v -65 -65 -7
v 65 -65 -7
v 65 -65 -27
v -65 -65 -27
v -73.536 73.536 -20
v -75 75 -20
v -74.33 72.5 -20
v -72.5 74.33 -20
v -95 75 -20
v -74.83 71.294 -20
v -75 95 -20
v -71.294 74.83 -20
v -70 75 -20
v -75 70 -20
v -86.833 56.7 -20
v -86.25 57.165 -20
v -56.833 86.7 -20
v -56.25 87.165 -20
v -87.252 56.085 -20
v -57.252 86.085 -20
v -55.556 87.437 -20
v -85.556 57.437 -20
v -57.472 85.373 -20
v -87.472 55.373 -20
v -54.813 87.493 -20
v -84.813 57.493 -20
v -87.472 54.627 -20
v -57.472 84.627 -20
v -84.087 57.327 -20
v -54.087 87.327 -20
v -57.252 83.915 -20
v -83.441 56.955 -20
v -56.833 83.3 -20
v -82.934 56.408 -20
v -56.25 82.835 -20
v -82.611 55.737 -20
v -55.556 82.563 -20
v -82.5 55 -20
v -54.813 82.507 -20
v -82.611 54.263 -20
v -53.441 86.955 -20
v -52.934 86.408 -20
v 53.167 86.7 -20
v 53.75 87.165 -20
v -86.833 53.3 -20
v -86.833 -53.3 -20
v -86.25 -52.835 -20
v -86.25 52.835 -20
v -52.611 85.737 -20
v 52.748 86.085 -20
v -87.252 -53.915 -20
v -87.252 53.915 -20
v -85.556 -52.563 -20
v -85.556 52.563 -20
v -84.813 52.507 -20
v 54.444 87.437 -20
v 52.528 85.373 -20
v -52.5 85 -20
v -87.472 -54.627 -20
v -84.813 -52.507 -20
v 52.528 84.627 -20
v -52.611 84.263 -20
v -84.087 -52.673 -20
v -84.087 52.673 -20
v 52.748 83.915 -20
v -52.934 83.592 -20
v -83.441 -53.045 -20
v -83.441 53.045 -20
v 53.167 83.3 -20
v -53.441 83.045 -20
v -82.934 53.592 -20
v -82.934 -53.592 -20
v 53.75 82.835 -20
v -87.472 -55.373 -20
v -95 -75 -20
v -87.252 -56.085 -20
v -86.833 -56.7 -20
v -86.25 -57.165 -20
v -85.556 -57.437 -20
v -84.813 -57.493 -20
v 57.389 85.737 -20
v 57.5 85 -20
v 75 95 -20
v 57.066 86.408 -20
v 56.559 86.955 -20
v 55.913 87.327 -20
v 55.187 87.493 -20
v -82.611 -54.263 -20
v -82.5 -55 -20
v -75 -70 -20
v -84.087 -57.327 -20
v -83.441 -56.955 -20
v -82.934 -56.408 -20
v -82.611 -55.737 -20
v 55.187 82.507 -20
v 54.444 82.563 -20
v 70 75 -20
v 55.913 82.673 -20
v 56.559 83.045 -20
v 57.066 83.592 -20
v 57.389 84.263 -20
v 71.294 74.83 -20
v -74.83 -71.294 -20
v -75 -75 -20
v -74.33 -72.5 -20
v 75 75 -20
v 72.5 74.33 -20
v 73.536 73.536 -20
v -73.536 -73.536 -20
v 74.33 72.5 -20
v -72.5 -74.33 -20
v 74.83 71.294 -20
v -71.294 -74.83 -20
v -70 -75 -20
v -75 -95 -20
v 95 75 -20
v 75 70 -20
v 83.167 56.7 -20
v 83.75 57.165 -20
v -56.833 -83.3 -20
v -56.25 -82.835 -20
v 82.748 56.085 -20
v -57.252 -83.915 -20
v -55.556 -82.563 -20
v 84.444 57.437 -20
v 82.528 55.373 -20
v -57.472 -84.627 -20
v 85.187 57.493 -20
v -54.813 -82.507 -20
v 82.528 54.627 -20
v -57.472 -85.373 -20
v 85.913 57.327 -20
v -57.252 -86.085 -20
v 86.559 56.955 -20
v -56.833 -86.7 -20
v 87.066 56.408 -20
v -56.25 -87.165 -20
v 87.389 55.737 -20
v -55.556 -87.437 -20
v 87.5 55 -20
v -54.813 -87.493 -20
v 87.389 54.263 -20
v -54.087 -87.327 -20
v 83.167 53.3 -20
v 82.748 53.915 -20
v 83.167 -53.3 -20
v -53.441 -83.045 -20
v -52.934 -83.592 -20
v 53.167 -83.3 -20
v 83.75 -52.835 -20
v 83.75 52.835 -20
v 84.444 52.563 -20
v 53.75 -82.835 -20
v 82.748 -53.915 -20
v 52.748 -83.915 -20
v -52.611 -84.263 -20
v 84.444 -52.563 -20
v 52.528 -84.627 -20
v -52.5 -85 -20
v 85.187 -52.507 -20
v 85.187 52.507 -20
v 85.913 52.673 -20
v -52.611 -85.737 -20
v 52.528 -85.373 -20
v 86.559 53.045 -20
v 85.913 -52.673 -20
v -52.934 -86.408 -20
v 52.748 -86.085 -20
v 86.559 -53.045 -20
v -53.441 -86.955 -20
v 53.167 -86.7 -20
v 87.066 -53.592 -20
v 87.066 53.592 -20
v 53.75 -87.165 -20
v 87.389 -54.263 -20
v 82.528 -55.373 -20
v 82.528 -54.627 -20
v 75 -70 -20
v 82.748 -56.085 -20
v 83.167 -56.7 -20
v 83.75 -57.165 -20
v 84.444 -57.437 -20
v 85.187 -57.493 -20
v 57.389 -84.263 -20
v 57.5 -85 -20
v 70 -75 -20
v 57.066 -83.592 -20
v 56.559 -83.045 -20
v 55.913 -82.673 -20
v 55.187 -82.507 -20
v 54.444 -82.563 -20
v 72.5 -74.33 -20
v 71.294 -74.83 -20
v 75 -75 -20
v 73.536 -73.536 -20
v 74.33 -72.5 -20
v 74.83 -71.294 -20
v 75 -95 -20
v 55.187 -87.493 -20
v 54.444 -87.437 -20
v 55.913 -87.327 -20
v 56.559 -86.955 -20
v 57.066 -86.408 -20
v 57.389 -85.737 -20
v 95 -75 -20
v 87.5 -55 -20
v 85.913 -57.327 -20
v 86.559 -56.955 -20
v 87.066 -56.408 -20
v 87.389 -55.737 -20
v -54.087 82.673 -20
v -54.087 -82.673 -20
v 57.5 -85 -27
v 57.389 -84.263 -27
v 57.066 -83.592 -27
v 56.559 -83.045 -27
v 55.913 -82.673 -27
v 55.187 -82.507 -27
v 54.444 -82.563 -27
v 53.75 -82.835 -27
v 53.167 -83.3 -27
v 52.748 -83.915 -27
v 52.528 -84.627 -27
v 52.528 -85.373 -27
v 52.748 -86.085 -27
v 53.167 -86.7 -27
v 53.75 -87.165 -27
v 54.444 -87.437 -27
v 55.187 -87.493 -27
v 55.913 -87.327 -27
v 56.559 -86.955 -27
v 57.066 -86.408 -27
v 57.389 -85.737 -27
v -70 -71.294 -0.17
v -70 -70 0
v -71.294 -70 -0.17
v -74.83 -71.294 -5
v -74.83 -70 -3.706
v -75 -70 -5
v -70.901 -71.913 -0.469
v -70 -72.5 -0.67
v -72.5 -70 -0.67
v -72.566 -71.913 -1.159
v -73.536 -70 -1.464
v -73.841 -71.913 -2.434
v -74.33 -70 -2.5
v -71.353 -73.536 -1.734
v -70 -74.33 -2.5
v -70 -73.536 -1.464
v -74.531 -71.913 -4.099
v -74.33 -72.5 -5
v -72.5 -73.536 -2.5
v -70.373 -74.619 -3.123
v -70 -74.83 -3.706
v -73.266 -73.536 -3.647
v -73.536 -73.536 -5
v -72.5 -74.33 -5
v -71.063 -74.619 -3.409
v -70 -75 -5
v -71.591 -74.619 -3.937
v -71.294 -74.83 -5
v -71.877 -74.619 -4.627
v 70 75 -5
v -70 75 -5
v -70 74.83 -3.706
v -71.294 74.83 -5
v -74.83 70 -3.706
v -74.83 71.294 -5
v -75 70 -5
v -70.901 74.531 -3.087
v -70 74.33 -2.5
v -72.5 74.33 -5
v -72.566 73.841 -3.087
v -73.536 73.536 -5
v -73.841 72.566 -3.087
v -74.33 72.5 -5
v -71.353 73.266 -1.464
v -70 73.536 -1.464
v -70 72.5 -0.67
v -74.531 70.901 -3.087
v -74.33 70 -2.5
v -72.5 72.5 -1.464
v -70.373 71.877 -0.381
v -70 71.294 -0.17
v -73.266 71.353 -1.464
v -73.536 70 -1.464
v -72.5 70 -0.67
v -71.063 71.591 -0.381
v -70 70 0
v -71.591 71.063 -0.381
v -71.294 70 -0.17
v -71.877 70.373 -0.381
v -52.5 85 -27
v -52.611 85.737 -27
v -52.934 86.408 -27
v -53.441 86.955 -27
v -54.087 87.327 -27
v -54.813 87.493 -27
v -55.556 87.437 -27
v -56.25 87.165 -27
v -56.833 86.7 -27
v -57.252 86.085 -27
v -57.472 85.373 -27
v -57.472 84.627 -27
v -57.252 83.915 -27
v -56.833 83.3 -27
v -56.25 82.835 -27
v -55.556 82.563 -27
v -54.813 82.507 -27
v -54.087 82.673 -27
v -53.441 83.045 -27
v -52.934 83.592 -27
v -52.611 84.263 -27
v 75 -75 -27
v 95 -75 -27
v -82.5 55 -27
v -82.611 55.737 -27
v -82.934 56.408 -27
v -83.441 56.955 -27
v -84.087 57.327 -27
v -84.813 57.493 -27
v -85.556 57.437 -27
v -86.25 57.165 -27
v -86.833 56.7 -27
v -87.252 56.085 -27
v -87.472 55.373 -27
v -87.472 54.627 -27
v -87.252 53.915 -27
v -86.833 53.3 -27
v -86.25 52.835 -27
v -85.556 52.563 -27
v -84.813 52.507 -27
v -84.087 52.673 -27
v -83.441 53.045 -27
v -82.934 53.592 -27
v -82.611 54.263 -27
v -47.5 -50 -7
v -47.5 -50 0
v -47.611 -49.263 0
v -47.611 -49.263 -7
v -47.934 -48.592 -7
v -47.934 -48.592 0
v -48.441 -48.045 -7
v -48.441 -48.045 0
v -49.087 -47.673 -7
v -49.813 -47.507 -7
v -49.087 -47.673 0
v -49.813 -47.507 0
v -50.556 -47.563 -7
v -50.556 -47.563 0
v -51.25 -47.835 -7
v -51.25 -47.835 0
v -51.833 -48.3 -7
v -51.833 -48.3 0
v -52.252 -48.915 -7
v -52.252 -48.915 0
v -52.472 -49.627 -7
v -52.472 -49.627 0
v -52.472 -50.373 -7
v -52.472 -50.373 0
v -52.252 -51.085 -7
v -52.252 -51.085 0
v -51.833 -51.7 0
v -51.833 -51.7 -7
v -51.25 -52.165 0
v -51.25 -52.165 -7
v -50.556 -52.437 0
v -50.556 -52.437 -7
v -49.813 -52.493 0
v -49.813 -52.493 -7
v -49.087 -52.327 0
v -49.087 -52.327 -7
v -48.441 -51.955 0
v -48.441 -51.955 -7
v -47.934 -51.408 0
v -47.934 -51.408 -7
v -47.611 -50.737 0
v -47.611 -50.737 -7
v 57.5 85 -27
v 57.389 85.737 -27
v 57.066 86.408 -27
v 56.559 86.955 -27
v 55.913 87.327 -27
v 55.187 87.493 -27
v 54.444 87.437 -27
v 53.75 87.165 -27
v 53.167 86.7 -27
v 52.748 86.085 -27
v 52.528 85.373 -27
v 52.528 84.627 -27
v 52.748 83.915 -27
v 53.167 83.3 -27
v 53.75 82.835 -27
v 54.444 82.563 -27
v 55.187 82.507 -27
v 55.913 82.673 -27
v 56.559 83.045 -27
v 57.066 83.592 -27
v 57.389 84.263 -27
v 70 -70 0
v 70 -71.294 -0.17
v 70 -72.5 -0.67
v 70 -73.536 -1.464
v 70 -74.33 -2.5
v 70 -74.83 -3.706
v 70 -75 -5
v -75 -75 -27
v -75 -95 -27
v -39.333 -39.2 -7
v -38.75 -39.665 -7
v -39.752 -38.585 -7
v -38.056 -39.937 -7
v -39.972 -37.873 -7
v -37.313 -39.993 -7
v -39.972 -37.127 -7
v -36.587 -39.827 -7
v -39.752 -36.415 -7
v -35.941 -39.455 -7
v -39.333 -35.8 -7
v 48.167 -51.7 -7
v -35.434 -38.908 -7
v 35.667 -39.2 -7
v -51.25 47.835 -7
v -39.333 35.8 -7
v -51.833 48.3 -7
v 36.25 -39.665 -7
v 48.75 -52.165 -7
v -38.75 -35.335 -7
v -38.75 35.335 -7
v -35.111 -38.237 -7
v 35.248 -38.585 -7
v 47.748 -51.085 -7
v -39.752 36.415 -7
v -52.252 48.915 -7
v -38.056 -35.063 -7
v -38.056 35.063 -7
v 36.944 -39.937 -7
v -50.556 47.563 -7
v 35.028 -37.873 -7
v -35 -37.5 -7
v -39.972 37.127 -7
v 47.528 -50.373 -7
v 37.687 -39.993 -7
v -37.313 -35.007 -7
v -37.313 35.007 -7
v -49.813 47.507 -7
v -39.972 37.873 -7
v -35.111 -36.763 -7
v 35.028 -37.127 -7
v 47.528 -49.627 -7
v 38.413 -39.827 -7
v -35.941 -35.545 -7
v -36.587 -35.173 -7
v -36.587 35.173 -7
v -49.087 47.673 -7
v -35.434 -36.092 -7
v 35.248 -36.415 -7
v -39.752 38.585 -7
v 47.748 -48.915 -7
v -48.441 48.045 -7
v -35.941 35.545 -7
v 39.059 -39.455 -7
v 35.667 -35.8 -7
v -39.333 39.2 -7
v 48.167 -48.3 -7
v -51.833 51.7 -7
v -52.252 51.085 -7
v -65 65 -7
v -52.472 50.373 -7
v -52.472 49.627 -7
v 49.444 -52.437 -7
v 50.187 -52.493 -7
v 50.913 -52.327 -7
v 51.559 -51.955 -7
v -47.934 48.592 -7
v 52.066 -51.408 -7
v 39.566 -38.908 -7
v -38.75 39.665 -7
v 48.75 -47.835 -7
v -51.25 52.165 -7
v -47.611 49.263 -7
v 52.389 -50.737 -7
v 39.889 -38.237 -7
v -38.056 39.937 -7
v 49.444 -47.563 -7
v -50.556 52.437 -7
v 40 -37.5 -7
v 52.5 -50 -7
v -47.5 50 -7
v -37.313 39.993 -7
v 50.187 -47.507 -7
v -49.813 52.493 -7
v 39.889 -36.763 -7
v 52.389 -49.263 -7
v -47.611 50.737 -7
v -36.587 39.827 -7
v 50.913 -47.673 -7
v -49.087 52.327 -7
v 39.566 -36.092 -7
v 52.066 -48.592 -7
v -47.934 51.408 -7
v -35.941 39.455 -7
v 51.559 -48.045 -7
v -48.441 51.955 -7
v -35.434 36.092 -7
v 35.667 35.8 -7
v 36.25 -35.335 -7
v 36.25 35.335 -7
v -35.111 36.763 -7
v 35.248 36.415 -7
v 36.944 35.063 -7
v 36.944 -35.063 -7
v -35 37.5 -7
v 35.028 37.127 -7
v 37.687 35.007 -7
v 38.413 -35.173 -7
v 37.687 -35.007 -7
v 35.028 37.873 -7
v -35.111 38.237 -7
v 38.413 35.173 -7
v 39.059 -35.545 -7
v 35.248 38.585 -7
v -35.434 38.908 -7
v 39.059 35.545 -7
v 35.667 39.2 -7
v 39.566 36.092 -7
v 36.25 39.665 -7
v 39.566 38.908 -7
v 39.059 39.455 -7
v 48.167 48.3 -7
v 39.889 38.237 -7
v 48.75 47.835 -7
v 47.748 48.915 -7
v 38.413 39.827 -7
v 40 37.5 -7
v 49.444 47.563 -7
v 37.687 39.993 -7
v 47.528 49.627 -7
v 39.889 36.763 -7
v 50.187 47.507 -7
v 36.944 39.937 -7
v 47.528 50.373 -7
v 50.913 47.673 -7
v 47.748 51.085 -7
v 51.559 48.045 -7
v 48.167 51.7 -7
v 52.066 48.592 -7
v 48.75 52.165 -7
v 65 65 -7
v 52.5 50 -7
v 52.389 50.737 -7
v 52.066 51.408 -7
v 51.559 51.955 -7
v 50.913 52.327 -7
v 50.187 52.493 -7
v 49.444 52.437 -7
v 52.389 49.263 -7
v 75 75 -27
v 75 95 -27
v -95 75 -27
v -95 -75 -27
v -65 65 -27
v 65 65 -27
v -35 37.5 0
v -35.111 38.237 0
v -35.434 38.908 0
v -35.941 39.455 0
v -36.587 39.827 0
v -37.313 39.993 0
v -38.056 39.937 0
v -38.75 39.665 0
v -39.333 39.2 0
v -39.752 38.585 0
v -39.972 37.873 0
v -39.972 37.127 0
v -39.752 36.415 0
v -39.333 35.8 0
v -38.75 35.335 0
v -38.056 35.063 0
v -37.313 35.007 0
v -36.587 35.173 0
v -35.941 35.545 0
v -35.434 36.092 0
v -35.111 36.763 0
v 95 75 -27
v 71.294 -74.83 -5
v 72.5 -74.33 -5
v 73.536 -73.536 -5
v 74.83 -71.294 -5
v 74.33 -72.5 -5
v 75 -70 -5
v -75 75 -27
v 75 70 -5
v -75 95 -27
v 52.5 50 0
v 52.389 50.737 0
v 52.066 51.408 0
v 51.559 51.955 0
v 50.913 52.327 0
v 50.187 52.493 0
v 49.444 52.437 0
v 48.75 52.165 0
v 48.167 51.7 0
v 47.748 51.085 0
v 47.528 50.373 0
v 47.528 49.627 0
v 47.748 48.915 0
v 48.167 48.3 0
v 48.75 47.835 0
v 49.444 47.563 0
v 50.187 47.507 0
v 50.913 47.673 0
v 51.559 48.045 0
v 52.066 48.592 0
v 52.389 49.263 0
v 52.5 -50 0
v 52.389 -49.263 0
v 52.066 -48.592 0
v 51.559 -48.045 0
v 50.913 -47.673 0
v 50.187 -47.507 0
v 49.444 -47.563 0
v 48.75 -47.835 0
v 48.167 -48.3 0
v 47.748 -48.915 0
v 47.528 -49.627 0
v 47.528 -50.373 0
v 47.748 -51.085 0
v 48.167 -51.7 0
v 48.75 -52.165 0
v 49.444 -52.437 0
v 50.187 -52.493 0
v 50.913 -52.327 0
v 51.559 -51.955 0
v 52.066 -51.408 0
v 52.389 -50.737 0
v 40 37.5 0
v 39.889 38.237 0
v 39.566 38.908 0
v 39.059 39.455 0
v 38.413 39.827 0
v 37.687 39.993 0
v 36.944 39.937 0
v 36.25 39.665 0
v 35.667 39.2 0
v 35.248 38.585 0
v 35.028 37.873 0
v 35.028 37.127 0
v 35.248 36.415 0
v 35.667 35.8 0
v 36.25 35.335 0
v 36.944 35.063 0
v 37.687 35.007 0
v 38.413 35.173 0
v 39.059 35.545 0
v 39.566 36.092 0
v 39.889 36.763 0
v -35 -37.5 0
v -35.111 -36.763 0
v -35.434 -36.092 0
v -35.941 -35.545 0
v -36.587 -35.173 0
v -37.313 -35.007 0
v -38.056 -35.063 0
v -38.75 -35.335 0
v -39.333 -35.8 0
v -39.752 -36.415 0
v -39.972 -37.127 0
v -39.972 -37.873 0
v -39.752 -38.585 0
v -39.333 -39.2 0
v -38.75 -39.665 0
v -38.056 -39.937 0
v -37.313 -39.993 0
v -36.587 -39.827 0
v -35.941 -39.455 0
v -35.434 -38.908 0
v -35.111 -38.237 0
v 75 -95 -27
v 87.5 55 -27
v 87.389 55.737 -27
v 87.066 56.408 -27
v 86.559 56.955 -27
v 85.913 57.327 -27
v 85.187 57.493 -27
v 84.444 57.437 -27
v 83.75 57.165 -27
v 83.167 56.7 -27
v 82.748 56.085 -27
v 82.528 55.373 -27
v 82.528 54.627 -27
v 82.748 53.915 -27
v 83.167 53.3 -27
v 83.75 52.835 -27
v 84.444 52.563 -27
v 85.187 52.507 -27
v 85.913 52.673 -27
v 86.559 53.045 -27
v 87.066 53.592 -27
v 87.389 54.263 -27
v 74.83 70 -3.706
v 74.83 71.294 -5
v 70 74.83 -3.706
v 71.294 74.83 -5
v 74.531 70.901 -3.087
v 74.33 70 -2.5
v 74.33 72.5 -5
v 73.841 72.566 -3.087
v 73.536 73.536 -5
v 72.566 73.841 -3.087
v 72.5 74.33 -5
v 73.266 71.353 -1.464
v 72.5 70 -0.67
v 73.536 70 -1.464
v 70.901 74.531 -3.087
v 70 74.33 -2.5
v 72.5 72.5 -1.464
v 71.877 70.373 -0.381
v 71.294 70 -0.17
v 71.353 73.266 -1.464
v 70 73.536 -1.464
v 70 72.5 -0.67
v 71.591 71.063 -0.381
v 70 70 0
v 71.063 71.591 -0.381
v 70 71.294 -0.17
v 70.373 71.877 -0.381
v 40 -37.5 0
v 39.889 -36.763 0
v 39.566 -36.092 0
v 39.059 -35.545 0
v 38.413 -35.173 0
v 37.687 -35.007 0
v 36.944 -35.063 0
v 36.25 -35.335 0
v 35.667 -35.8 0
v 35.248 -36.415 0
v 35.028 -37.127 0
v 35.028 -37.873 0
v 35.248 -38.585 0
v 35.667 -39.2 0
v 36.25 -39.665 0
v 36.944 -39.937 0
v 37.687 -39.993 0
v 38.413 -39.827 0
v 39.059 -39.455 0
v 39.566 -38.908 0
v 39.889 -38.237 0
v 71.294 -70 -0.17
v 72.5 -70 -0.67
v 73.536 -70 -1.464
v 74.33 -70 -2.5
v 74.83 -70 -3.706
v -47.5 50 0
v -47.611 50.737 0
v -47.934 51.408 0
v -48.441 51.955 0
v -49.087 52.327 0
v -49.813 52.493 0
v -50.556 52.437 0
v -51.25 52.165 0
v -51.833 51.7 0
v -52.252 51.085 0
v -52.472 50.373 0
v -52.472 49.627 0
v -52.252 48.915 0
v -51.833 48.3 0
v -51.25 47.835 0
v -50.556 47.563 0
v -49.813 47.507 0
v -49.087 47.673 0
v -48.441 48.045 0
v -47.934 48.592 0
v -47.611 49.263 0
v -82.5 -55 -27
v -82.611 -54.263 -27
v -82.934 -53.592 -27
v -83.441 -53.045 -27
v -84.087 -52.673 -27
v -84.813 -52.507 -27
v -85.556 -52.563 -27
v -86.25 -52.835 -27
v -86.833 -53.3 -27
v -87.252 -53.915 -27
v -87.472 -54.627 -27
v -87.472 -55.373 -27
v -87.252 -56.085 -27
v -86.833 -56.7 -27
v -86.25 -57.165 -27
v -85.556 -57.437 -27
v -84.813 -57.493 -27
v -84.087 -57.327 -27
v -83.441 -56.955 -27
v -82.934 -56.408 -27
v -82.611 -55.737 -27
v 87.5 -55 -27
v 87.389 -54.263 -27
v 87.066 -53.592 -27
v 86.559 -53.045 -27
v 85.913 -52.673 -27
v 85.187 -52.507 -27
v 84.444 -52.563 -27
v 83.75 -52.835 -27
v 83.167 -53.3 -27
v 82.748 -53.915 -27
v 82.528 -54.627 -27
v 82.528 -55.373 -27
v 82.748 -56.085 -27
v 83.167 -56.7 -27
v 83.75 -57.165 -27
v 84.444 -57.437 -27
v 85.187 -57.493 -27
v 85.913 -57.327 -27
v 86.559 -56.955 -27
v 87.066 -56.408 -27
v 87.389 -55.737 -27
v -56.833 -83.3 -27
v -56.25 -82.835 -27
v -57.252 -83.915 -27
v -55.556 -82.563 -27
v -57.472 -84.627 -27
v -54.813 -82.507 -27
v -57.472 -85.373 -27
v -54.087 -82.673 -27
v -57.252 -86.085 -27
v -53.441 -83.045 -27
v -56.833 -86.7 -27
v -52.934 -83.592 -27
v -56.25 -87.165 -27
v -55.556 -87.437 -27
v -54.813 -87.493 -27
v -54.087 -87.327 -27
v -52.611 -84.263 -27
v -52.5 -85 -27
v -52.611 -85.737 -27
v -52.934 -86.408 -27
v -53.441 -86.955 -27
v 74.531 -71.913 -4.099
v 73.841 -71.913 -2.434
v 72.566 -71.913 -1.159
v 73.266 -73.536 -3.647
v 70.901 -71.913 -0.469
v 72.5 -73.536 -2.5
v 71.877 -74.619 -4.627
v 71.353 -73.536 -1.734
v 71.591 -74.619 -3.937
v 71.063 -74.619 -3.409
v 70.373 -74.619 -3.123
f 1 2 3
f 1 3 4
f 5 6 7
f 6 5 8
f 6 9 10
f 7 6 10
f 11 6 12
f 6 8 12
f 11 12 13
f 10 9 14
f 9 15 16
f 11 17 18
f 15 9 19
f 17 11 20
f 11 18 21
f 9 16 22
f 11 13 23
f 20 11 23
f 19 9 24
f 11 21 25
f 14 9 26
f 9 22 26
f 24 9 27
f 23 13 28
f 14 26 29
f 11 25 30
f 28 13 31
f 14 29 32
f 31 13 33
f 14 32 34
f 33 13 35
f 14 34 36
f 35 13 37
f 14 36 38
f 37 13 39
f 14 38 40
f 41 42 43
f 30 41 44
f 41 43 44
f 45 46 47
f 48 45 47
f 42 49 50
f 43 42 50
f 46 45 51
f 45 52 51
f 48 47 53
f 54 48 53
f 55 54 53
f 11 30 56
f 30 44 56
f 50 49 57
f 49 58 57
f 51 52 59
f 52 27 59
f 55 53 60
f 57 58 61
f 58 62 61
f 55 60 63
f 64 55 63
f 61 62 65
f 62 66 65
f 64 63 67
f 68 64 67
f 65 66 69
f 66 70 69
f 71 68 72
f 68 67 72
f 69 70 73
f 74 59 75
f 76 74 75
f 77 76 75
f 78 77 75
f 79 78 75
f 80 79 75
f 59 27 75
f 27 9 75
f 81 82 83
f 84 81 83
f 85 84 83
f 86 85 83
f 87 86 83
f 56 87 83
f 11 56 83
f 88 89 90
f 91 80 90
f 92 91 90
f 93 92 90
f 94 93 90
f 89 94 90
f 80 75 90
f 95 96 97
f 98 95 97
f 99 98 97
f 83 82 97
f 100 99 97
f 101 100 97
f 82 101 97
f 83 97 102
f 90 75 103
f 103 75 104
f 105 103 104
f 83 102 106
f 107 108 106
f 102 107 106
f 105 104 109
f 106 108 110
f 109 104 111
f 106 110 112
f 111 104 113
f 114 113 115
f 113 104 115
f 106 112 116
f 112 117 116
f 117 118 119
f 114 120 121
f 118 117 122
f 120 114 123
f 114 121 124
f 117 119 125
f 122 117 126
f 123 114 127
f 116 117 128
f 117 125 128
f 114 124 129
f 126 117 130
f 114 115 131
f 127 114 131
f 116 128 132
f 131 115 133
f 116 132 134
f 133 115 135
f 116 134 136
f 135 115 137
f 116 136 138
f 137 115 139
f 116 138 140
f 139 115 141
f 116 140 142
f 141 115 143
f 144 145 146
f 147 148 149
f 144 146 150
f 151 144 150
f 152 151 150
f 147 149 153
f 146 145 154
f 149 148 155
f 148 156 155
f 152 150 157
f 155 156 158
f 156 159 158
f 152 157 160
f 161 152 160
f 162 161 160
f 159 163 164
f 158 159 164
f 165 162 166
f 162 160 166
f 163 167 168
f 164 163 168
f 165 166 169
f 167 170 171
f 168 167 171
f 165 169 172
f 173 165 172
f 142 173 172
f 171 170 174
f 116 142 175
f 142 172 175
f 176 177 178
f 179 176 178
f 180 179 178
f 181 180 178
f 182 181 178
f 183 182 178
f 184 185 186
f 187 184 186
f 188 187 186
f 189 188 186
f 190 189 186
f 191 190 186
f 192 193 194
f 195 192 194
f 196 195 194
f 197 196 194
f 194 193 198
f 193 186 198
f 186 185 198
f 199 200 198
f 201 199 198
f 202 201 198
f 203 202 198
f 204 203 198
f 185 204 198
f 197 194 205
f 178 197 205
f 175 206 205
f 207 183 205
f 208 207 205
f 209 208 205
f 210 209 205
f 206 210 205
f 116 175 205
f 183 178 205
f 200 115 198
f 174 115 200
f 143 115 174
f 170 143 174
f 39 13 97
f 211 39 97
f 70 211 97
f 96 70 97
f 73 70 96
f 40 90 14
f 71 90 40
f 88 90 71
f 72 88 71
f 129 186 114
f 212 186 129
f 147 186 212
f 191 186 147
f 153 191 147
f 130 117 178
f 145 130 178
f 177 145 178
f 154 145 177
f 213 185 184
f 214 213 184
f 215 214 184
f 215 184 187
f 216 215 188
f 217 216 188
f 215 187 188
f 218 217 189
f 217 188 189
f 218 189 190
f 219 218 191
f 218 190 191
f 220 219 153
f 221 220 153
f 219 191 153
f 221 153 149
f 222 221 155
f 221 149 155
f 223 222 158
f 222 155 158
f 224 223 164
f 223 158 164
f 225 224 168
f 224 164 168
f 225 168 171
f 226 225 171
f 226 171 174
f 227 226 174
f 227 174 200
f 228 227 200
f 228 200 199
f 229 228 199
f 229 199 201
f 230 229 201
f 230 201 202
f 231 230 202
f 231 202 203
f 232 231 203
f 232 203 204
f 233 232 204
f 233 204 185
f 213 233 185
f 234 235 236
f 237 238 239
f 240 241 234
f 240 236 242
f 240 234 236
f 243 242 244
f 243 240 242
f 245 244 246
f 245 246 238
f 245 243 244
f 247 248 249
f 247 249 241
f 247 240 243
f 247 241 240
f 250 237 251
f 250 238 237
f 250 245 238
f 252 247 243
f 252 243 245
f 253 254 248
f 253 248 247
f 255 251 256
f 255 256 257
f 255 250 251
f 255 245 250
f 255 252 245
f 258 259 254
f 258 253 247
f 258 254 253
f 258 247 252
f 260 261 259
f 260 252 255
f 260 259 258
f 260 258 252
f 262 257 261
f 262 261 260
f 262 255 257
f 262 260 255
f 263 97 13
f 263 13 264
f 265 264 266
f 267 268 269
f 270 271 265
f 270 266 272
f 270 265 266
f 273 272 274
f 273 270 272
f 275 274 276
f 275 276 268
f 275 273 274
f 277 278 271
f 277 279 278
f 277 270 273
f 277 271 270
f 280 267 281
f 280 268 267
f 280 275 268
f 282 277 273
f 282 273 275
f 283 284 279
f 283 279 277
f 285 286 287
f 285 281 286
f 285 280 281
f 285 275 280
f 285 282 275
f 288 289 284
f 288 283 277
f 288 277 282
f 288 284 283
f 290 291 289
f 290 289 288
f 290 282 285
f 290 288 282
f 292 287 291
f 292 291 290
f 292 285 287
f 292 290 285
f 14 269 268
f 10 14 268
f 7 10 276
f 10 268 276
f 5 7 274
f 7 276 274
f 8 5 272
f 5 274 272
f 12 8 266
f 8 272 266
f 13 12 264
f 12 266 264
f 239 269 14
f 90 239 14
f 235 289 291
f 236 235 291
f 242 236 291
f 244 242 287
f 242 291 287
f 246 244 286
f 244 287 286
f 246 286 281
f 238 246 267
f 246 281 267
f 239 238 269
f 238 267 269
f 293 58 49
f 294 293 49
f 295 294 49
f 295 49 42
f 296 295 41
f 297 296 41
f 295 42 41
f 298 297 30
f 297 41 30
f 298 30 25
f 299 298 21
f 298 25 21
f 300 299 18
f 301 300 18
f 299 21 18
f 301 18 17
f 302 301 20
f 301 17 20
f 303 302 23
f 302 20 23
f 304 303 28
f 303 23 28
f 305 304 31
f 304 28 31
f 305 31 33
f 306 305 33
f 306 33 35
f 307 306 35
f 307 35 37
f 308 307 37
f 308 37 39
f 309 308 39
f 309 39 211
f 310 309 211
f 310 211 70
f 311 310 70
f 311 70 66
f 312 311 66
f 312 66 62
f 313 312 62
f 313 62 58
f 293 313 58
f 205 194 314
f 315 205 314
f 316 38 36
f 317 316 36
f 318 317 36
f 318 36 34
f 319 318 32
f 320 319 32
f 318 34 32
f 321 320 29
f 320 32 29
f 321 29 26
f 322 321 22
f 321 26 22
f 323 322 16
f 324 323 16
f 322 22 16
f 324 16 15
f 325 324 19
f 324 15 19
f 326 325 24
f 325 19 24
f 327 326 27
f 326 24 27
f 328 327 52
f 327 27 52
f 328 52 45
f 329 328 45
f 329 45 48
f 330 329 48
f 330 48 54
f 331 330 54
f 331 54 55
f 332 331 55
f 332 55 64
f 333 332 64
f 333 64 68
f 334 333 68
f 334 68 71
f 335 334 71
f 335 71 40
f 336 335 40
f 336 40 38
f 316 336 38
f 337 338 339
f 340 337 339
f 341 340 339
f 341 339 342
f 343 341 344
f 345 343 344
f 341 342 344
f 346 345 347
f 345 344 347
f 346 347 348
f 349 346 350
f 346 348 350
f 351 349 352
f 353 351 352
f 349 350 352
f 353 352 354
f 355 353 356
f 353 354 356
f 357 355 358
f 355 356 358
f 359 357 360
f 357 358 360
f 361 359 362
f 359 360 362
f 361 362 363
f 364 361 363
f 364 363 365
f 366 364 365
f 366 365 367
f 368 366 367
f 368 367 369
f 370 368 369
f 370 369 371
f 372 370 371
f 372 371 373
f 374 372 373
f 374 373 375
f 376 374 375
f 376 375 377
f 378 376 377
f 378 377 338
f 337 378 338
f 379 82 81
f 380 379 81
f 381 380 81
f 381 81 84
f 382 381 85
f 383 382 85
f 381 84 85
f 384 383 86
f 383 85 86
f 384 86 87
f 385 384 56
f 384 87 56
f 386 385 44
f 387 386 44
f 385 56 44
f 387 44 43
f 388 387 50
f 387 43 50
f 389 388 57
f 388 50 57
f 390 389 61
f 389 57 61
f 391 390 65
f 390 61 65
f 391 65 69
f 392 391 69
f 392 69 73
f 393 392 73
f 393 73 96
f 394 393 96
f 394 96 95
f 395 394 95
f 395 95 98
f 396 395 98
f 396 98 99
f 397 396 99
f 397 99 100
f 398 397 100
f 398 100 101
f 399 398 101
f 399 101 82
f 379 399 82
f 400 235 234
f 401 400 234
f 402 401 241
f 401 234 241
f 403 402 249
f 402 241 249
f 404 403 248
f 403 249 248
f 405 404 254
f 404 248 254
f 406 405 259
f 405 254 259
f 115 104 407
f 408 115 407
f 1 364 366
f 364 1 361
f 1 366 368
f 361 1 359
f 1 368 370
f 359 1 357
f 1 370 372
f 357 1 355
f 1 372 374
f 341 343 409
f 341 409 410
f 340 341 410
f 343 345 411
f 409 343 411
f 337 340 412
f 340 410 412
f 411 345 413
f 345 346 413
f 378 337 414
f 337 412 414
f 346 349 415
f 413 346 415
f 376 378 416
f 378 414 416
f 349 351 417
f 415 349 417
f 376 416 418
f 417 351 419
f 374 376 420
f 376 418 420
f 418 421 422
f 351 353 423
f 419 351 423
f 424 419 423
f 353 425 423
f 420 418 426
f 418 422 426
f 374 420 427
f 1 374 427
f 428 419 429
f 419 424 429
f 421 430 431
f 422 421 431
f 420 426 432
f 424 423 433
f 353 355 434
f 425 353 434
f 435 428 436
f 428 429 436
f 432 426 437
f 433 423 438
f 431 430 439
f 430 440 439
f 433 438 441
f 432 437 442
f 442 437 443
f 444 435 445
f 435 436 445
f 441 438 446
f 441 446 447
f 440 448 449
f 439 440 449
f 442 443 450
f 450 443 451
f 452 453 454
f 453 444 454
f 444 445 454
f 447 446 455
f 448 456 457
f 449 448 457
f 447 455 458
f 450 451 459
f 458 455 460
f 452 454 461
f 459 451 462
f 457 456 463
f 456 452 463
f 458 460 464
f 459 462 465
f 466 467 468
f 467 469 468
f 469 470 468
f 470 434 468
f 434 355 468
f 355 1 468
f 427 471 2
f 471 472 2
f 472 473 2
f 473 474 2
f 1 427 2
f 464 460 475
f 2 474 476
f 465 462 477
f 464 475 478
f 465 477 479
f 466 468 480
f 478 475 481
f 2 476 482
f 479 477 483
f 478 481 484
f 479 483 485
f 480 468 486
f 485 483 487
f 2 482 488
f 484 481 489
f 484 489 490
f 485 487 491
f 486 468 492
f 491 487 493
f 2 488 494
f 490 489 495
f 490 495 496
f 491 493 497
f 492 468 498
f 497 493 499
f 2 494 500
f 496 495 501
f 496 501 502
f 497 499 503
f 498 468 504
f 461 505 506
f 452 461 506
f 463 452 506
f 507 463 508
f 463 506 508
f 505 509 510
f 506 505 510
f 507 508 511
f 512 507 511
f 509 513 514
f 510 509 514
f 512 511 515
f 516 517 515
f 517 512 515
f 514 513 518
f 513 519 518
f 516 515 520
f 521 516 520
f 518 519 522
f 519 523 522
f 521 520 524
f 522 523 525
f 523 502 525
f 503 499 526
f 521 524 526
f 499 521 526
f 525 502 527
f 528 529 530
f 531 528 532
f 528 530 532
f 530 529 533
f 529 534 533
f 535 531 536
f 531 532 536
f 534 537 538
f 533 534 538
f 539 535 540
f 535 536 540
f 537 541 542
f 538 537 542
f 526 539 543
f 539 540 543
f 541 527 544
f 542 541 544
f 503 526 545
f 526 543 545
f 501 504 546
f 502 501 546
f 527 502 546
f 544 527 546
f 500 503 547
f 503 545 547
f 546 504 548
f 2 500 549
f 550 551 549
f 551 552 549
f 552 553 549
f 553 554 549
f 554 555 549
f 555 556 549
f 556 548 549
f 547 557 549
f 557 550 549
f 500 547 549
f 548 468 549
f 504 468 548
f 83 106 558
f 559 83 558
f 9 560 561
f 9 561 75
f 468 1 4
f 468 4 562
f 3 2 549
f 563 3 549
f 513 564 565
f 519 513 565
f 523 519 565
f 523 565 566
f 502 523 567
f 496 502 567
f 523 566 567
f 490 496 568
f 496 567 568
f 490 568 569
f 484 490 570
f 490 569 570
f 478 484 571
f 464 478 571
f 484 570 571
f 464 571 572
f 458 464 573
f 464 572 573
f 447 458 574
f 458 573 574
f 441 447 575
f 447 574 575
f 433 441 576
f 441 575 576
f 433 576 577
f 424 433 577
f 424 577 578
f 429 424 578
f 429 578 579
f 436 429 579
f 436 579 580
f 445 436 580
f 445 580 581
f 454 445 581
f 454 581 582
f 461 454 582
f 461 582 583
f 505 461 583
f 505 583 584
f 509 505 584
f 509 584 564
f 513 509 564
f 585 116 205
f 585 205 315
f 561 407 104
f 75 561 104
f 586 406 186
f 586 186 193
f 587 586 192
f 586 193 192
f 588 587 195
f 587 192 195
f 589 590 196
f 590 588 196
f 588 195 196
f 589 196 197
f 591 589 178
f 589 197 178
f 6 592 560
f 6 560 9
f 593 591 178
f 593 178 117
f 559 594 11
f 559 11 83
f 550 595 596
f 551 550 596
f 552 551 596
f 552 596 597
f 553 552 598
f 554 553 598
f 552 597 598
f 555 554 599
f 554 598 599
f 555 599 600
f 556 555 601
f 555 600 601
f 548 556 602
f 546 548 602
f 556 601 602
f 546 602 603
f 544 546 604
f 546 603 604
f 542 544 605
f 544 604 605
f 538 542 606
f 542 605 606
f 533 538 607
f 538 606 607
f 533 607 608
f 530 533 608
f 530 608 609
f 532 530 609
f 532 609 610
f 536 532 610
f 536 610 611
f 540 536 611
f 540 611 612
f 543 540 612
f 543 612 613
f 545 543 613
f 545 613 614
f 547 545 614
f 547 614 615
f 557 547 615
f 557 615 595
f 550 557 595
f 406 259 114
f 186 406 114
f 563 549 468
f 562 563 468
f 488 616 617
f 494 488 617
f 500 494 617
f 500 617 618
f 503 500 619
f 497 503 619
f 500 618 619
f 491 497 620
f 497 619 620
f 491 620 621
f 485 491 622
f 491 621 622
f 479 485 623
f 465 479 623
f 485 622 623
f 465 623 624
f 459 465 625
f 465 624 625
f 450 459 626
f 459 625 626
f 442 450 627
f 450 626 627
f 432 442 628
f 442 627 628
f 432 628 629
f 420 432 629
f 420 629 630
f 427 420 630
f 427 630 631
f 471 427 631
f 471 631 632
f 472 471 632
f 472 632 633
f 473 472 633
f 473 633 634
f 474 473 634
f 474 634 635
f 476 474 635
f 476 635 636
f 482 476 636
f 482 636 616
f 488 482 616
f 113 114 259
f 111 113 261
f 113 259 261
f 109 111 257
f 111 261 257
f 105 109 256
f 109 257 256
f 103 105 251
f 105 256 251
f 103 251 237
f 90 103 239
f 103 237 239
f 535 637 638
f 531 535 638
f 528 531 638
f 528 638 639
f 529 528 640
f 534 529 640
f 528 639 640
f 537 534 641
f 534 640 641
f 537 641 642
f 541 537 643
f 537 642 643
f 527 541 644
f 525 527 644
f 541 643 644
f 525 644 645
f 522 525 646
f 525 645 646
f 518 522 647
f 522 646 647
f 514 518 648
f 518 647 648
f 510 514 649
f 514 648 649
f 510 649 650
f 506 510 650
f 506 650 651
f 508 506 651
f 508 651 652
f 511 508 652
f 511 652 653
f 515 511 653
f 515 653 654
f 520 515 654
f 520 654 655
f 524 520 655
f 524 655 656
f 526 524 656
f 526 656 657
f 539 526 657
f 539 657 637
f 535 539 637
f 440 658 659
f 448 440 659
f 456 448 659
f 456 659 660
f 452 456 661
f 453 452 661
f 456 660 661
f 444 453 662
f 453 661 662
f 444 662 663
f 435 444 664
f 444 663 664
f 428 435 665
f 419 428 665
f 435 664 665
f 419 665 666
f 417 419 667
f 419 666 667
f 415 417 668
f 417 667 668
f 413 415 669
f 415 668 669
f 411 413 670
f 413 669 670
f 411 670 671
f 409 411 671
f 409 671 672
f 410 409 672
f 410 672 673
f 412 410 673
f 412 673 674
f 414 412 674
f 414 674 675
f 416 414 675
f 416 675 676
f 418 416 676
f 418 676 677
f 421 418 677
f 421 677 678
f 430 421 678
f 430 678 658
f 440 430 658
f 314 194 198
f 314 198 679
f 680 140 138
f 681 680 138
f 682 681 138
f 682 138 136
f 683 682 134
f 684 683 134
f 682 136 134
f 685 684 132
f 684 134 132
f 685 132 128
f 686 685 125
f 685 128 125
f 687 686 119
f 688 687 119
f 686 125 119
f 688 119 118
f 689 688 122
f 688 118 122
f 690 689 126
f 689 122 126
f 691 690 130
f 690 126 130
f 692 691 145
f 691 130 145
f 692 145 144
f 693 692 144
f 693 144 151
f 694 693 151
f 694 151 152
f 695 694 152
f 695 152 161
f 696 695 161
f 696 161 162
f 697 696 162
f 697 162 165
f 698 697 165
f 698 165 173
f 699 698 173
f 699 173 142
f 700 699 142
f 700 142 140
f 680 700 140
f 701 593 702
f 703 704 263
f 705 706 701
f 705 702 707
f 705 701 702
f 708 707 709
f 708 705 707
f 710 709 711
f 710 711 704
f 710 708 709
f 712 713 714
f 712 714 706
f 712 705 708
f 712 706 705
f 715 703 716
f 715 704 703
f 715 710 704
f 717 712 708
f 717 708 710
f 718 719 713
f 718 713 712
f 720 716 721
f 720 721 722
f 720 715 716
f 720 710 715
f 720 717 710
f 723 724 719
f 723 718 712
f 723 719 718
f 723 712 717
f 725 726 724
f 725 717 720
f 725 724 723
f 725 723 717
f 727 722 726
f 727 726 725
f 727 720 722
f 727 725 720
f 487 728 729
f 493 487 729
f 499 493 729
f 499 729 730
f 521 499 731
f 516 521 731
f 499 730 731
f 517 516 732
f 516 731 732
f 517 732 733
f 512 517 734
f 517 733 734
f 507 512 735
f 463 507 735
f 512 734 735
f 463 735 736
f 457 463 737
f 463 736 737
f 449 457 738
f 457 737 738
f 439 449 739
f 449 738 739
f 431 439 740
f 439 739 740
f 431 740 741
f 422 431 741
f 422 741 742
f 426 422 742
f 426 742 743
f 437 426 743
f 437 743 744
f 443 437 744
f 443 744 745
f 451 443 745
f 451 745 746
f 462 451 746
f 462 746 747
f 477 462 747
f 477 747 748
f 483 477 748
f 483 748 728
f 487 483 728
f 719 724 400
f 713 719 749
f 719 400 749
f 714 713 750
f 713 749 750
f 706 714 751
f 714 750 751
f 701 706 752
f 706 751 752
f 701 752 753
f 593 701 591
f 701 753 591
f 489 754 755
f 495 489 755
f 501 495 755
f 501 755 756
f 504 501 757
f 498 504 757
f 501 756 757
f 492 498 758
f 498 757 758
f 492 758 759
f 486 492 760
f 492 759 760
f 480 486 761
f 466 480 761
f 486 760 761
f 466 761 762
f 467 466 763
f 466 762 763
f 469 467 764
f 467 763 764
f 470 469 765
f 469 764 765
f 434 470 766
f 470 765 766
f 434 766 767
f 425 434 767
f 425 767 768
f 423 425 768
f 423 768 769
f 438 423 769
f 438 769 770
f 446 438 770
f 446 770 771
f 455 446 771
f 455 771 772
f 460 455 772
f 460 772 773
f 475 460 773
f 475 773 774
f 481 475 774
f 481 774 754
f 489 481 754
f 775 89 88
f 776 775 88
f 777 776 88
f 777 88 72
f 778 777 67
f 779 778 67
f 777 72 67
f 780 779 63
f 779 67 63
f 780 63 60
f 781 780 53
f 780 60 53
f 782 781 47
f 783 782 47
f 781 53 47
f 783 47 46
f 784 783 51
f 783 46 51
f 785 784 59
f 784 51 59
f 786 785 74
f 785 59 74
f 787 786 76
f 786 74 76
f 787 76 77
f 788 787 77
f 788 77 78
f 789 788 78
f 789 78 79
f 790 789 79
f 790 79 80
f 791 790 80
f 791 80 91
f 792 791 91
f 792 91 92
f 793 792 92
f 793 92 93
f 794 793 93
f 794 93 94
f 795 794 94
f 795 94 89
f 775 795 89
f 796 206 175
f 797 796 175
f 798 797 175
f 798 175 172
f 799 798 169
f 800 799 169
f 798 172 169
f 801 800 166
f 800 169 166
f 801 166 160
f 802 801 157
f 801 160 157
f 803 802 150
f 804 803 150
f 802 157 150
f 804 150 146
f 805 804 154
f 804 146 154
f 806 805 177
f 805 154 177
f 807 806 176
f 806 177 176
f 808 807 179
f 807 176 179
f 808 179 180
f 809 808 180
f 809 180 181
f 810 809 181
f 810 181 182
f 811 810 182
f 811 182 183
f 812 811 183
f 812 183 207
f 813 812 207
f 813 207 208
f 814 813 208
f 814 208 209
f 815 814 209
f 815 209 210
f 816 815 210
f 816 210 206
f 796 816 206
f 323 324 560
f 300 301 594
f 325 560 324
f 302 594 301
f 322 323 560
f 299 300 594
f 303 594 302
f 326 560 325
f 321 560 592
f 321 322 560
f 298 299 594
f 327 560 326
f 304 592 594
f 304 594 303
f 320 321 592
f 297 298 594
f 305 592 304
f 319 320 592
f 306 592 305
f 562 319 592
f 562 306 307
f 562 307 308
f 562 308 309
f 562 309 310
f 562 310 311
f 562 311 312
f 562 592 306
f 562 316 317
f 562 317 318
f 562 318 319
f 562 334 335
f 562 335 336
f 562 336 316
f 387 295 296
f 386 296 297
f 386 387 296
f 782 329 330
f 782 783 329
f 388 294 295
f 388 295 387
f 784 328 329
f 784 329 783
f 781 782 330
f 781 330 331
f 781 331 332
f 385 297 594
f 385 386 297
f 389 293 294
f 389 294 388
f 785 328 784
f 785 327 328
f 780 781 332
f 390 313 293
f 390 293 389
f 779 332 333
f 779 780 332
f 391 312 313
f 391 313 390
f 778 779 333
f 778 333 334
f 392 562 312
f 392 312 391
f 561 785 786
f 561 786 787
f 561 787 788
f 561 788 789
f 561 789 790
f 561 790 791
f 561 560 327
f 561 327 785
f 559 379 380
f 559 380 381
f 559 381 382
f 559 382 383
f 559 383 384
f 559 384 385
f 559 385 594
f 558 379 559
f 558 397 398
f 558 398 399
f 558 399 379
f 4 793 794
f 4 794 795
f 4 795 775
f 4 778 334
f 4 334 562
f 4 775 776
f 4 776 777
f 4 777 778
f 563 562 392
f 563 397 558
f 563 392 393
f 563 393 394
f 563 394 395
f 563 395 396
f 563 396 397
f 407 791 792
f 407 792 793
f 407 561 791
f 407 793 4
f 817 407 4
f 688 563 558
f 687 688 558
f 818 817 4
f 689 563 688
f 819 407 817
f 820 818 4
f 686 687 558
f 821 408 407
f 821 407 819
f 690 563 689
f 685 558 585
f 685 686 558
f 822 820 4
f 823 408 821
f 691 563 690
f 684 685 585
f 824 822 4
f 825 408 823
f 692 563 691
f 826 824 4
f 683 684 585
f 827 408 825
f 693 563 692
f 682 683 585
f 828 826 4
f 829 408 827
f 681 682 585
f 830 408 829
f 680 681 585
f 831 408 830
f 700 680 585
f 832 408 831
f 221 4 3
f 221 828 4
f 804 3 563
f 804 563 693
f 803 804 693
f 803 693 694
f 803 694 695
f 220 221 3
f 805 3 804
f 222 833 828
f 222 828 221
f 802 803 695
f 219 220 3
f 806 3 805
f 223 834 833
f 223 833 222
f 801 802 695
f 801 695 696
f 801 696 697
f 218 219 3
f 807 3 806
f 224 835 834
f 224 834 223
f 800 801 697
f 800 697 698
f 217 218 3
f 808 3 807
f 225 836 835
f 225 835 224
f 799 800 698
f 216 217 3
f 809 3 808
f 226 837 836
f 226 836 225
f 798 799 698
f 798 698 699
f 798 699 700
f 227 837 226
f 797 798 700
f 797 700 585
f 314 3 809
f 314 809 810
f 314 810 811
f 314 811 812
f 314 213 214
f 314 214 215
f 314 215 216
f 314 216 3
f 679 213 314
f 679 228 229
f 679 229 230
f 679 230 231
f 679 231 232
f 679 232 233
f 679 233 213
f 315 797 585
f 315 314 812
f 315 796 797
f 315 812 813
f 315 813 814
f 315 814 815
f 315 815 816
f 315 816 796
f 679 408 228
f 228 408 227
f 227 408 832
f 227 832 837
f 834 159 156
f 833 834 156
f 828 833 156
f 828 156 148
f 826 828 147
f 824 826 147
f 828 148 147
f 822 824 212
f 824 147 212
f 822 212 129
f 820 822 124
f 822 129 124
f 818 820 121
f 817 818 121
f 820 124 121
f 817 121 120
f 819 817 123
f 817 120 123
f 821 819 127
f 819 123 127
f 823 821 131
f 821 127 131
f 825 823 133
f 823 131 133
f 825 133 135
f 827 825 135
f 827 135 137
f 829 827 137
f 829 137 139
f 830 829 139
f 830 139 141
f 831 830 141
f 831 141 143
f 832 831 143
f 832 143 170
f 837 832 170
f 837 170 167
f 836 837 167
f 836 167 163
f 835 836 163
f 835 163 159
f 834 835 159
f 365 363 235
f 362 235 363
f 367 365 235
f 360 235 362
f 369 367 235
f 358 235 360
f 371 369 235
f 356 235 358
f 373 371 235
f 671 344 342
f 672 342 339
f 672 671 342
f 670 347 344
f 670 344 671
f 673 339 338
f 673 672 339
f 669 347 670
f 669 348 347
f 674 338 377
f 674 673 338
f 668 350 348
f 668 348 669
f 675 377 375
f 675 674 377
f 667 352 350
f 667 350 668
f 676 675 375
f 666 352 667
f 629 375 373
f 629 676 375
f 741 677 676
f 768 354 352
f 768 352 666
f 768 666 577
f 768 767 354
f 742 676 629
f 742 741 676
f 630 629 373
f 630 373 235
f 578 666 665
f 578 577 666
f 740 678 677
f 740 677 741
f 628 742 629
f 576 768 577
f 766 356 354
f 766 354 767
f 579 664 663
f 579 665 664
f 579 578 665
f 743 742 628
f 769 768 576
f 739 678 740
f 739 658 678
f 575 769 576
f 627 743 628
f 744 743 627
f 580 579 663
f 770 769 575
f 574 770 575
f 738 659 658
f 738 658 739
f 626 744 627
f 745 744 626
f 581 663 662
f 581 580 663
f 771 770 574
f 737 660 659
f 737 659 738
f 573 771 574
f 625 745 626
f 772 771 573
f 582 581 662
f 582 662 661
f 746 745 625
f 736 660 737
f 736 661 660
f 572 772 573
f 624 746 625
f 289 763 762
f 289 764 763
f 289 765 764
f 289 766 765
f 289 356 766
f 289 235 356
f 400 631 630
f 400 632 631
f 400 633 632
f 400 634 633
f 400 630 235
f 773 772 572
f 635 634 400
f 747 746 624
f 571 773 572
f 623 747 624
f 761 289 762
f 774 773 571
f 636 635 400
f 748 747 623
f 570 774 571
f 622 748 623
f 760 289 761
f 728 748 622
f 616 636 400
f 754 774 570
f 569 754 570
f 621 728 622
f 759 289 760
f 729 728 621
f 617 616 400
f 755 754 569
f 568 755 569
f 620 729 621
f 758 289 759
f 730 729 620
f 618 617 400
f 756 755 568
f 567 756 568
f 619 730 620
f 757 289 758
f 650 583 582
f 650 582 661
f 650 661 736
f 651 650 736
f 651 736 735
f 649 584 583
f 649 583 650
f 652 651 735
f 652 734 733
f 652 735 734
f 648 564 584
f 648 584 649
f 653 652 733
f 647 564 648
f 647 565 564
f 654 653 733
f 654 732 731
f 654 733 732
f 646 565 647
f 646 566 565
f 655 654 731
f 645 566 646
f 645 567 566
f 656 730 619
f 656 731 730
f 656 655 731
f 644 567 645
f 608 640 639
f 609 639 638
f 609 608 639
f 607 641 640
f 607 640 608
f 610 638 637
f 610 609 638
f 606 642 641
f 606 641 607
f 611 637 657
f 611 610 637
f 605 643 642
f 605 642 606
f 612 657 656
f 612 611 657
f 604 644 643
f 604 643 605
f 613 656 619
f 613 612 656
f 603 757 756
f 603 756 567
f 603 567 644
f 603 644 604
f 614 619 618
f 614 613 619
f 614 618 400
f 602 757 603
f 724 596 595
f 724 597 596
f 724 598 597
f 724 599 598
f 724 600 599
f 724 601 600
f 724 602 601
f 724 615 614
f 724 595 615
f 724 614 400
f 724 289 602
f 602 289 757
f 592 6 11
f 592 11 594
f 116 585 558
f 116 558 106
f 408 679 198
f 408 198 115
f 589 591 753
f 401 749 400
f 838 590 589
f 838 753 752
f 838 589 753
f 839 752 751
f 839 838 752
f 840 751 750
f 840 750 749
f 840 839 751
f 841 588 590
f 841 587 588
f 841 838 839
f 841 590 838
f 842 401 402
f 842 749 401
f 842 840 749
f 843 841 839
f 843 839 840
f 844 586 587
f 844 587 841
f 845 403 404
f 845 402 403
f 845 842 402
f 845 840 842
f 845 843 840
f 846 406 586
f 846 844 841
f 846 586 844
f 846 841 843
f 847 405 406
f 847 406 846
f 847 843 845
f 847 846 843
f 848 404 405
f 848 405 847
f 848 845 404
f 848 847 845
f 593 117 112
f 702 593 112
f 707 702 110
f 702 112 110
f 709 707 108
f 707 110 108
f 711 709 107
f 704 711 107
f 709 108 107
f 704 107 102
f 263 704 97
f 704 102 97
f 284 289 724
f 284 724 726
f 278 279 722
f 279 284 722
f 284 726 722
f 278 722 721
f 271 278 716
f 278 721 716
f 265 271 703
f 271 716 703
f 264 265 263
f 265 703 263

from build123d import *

# Parameters (mm, degrees)
SKETCH1_W           = 150
SKETCH1_H           = 150
BASE_FLANGE1_DEPTH  = 7
SKETCH23_W          = 150
SKETCH23_H          = 150
SKETCH23_W_2        = 130
SKETCH23_H_2        = 130
BOSS_EXTRUDE3_DEPTH = 20
SKETCH27_W          = 7
SKETCH27_H          = 150
BOSS_EXTRUDE4_DEPTH = 20
SKETCH28_W          = 150
SKETCH28_H          = 7
BOSS_EXTRUDE5_DEPTH = 20
SKETCH29_W          = 7
SKETCH29_H          = 150
BOSS_EXTRUDE6_DEPTH = 20
SKETCH30_W          = 150
SKETCH30_H          = 7
BOSS_EXTRUDE7_DEPTH = 20
SKETCH31_R          = 2.5
CUT_EXTRUDE1_DEPTH  = 20
SKETCH32_R          = 2.5
CUT_EXTRUDE2_DEPTH  = 20
FILLET1_R           = 5


# Sheet-metal steps are written as plain solids
with BuildPart() as part:
    # Sketch1 → Base-Flange1 (new body)
    with BuildSketch(Plane.XY):
        Rectangle(SKETCH1_W, SKETCH1_H)
    extrude(amount=-BASE_FLANGE1_DEPTH)

    # Sketch23 → Boss-Extrude3 (add)
    with BuildSketch(Plane(origin=(0, 0, -7), x_dir=(-1, 0, 0), z_dir=(0, 0, -1))):
        Rectangle(SKETCH23_W, SKETCH23_H)
        Rectangle(SKETCH23_W_2, SKETCH23_H_2, mode=Mode.SUBTRACT)
    extrude(amount=BOSS_EXTRUDE3_DEPTH)

    # Sketch27 → Boss-Extrude4 (add)
    with BuildSketch(Plane(origin=(75, 0, 0), x_dir=(0, 0, -1), z_dir=(1, 0, 0))):
        with Locations((23.5, 0)):
            Rectangle(SKETCH27_W, SKETCH27_H)
    extrude(amount=BOSS_EXTRUDE4_DEPTH)

    # Sketch28 → Boss-Extrude5 (add)
    with BuildSketch(Plane(origin=(0, -75, 0), x_dir=(-1, 0, 0), z_dir=(0, -1, 0))):
        with Locations((0, 23.5)):
            Rectangle(SKETCH28_W, SKETCH28_H)
    extrude(amount=BOSS_EXTRUDE5_DEPTH)

    # Sketch29 → Boss-Extrude6 (add)
    with BuildSketch(Plane.ZY.offset(75)):
        with Locations((-23.5, 0)):
            Rectangle(SKETCH29_W, SKETCH29_H)
    extrude(amount=BOSS_EXTRUDE6_DEPTH)

    # Sketch30 → Boss-Extrude7 (add)
    with BuildSketch(Plane(origin=(0, 75, 0), x_dir=(1, 0, 0), z_dir=(0, 1, 0))):
        with Locations((0, 23.5)):
            Rectangle(SKETCH30_W, SKETCH30_H)
    extrude(amount=BOSS_EXTRUDE7_DEPTH)

    # Sketch31 → Cut-Extrude1 (cut)
    with BuildSketch(Plane.XY):
        with Locations((-50, -50)):
            Circle(SKETCH31_R)
        with Locations((-50, 50)):
            Circle(SKETCH31_R)
        with Locations((50, 50)):
            Circle(SKETCH31_R)
        with Locations((50, -50)):
            Circle(SKETCH31_R)
        with Locations((37.5, 37.5)):
            Circle(SKETCH31_R)
        with Locations((-37.5, 37.5)):
            Circle(SKETCH31_R)
        with Locations((37.5, -37.5)):
            Circle(SKETCH31_R)
        with Locations((-37.5, -37.5)):
            Circle(SKETCH31_R)
    extrude(amount=-CUT_EXTRUDE1_DEPTH, mode=Mode.SUBTRACT)

    # Sketch32 → Cut-Extrude2 (cut)
    with BuildSketch(Plane.XY.offset(-20)):
        with Locations((85, 55)):
            Circle(SKETCH32_R)
        with Locations((85, -55)):
            Circle(SKETCH32_R)
        with Locations((55, -85)):
            Circle(SKETCH32_R)
        with Locations((-55, -85)):
            Circle(SKETCH32_R)
        with Locations((-85, -55)):
            Circle(SKETCH32_R)
        with Locations((-85, 55)):
            Circle(SKETCH32_R)
        with Locations((-55, 85)):
            Circle(SKETCH32_R)
        with Locations((55, 85)):
            Circle(SKETCH32_R)
    extrude(amount=-CUT_EXTRUDE2_DEPTH, mode=Mode.SUBTRACT)

    # Fillet1
    # the kernel refuses this fillet: 5 mm, written as the material it takes off along each edge
    with BuildSketch(Plane(origin=(70, -70, -5), x_dir=(0, 0, 1), z_dir=(0, -1, 0))) as fillet1_piece_1_section:
        Polygon((0, 0), (FILLET1_R, 0), (FILLET1_R, -FILLET1_R), (0, -FILLET1_R), align=None)
    fillet1_piece_1 = extrude(amount=FILLET1_R, mode=Mode.PRIVATE)
    fillet1_piece_1 = fillet1_piece_1 - Plane(origin=(70, -70, -5), x_dir=(-0.7071067811865475, 0, -0.7071067811865475), z_dir=(0, -1, 0)) * Sphere(FILLET1_R, mode=Mode.PRIVATE)
    add(fillet1_piece_1, mode=Mode.SUBTRACT)
    with BuildSketch(Plane(origin=(70, 70, -5), x_dir=(1, 0, 0), z_dir=(0, 0, 1))) as fillet1_piece_2_section:
        Polygon((0, 0), (FILLET1_R, 0), (FILLET1_R, FILLET1_R), (0, FILLET1_R), align=None)
    fillet1_piece_2 = extrude(amount=FILLET1_R, mode=Mode.PRIVATE)
    fillet1_piece_2 = fillet1_piece_2 - Plane(origin=(70, 70, -5), x_dir=(-0.7071067811865475, -0.7071067811865475, 0), z_dir=(0, 0, 1)) * Sphere(FILLET1_R, mode=Mode.PRIVATE)
    add(fillet1_piece_2, mode=Mode.SUBTRACT)
    with BuildSketch(Plane(origin=(-70, -70, -5), x_dir=(0, 0, 1), z_dir=(0, -1, 0))) as fillet1_piece_3_section:
        Polygon((0, 0), (FILLET1_R, 0), (FILLET1_R, FILLET1_R), (0, FILLET1_R), align=None)
    fillet1_piece_3 = extrude(amount=FILLET1_R, mode=Mode.PRIVATE)
    fillet1_piece_3 = fillet1_piece_3 - Plane(origin=(-70, -70, -5), x_dir=(0.7071067811865475, 0, -0.7071067811865475), z_dir=(0, -1, 0)) * Sphere(FILLET1_R, mode=Mode.PRIVATE)
    add(fillet1_piece_3, mode=Mode.SUBTRACT)
    with BuildSketch(Plane(origin=(-70, 70, -5), x_dir=(-1, 0, 0), z_dir=(0, 0, 1))) as fillet1_piece_4_section:
        Polygon((0, 0), (FILLET1_R, 0), (FILLET1_R, -FILLET1_R), (0, -FILLET1_R), align=None)
    fillet1_piece_4 = extrude(amount=FILLET1_R, mode=Mode.PRIVATE)
    fillet1_piece_4 = fillet1_piece_4 - Plane(origin=(-70, 70, -5), x_dir=(0.7071067811865475, -0.7071067811865475, 0), z_dir=(0, 0, 1)) * Sphere(FILLET1_R, mode=Mode.PRIVATE)
    add(fillet1_piece_4, mode=Mode.SUBTRACT)
    with BuildSketch(Plane(origin=(75, -75, -20), x_dir=(-1, 0, 0), z_dir=(0, 0, 1)), Plane(origin=(75, 75, -20), x_dir=(0, -1, 0), z_dir=(0, 0, 1)), Plane(origin=(-75, -75, -5), x_dir=(1, 0, 0), z_dir=(0, 0, -1)), Plane(origin=(-75, 75, -5), x_dir=(0, -1, 0), z_dir=(0, 0, -1))) as fillet1_piece_5:
        with BuildLine():
            CenterArc((FILLET1_R, -FILLET1_R), FILLET1_R, 90, 90)
            Line((0, -FILLET1_R), (0, 0))
            Line((0, 0), (FILLET1_R, 0))
        make_face()
    extrude(amount=15, mode=Mode.SUBTRACT)
    with BuildSketch(Plane(origin=(-70, -75, 0), x_dir=(0, 0, -1), z_dir=(1, 0, 0))) as fillet1_piece_6:
        with BuildLine():
            CenterArc((FILLET1_R, FILLET1_R), FILLET1_R, 180, 90)
            Line((0, FILLET1_R), (0, 0))
            Line((0, 0), (FILLET1_R, 0))
        make_face()
    extrude(amount=140, mode=Mode.SUBTRACT)
    with BuildSketch(Plane(origin=(-75, 70, 0), x_dir=(1, 0, 0), z_dir=(0, -1, 0)), Plane(origin=(70, 75, 0), x_dir=(0, -1, 0), z_dir=(-1, 0, 0)), Plane(origin=(75, -70, 0), x_dir=(-1, 0, 0), z_dir=(0, 1, 0))) as fillet1_piece_7:
        with BuildLine():
            CenterArc((FILLET1_R, -FILLET1_R), FILLET1_R, 90, 90)
            Line((0, -FILLET1_R), (0, 0))
            Line((0, 0), (FILLET1_R, 0))
        make_face()
    extrude(amount=140, mode=Mode.SUBTRACT)


solid = part.part
